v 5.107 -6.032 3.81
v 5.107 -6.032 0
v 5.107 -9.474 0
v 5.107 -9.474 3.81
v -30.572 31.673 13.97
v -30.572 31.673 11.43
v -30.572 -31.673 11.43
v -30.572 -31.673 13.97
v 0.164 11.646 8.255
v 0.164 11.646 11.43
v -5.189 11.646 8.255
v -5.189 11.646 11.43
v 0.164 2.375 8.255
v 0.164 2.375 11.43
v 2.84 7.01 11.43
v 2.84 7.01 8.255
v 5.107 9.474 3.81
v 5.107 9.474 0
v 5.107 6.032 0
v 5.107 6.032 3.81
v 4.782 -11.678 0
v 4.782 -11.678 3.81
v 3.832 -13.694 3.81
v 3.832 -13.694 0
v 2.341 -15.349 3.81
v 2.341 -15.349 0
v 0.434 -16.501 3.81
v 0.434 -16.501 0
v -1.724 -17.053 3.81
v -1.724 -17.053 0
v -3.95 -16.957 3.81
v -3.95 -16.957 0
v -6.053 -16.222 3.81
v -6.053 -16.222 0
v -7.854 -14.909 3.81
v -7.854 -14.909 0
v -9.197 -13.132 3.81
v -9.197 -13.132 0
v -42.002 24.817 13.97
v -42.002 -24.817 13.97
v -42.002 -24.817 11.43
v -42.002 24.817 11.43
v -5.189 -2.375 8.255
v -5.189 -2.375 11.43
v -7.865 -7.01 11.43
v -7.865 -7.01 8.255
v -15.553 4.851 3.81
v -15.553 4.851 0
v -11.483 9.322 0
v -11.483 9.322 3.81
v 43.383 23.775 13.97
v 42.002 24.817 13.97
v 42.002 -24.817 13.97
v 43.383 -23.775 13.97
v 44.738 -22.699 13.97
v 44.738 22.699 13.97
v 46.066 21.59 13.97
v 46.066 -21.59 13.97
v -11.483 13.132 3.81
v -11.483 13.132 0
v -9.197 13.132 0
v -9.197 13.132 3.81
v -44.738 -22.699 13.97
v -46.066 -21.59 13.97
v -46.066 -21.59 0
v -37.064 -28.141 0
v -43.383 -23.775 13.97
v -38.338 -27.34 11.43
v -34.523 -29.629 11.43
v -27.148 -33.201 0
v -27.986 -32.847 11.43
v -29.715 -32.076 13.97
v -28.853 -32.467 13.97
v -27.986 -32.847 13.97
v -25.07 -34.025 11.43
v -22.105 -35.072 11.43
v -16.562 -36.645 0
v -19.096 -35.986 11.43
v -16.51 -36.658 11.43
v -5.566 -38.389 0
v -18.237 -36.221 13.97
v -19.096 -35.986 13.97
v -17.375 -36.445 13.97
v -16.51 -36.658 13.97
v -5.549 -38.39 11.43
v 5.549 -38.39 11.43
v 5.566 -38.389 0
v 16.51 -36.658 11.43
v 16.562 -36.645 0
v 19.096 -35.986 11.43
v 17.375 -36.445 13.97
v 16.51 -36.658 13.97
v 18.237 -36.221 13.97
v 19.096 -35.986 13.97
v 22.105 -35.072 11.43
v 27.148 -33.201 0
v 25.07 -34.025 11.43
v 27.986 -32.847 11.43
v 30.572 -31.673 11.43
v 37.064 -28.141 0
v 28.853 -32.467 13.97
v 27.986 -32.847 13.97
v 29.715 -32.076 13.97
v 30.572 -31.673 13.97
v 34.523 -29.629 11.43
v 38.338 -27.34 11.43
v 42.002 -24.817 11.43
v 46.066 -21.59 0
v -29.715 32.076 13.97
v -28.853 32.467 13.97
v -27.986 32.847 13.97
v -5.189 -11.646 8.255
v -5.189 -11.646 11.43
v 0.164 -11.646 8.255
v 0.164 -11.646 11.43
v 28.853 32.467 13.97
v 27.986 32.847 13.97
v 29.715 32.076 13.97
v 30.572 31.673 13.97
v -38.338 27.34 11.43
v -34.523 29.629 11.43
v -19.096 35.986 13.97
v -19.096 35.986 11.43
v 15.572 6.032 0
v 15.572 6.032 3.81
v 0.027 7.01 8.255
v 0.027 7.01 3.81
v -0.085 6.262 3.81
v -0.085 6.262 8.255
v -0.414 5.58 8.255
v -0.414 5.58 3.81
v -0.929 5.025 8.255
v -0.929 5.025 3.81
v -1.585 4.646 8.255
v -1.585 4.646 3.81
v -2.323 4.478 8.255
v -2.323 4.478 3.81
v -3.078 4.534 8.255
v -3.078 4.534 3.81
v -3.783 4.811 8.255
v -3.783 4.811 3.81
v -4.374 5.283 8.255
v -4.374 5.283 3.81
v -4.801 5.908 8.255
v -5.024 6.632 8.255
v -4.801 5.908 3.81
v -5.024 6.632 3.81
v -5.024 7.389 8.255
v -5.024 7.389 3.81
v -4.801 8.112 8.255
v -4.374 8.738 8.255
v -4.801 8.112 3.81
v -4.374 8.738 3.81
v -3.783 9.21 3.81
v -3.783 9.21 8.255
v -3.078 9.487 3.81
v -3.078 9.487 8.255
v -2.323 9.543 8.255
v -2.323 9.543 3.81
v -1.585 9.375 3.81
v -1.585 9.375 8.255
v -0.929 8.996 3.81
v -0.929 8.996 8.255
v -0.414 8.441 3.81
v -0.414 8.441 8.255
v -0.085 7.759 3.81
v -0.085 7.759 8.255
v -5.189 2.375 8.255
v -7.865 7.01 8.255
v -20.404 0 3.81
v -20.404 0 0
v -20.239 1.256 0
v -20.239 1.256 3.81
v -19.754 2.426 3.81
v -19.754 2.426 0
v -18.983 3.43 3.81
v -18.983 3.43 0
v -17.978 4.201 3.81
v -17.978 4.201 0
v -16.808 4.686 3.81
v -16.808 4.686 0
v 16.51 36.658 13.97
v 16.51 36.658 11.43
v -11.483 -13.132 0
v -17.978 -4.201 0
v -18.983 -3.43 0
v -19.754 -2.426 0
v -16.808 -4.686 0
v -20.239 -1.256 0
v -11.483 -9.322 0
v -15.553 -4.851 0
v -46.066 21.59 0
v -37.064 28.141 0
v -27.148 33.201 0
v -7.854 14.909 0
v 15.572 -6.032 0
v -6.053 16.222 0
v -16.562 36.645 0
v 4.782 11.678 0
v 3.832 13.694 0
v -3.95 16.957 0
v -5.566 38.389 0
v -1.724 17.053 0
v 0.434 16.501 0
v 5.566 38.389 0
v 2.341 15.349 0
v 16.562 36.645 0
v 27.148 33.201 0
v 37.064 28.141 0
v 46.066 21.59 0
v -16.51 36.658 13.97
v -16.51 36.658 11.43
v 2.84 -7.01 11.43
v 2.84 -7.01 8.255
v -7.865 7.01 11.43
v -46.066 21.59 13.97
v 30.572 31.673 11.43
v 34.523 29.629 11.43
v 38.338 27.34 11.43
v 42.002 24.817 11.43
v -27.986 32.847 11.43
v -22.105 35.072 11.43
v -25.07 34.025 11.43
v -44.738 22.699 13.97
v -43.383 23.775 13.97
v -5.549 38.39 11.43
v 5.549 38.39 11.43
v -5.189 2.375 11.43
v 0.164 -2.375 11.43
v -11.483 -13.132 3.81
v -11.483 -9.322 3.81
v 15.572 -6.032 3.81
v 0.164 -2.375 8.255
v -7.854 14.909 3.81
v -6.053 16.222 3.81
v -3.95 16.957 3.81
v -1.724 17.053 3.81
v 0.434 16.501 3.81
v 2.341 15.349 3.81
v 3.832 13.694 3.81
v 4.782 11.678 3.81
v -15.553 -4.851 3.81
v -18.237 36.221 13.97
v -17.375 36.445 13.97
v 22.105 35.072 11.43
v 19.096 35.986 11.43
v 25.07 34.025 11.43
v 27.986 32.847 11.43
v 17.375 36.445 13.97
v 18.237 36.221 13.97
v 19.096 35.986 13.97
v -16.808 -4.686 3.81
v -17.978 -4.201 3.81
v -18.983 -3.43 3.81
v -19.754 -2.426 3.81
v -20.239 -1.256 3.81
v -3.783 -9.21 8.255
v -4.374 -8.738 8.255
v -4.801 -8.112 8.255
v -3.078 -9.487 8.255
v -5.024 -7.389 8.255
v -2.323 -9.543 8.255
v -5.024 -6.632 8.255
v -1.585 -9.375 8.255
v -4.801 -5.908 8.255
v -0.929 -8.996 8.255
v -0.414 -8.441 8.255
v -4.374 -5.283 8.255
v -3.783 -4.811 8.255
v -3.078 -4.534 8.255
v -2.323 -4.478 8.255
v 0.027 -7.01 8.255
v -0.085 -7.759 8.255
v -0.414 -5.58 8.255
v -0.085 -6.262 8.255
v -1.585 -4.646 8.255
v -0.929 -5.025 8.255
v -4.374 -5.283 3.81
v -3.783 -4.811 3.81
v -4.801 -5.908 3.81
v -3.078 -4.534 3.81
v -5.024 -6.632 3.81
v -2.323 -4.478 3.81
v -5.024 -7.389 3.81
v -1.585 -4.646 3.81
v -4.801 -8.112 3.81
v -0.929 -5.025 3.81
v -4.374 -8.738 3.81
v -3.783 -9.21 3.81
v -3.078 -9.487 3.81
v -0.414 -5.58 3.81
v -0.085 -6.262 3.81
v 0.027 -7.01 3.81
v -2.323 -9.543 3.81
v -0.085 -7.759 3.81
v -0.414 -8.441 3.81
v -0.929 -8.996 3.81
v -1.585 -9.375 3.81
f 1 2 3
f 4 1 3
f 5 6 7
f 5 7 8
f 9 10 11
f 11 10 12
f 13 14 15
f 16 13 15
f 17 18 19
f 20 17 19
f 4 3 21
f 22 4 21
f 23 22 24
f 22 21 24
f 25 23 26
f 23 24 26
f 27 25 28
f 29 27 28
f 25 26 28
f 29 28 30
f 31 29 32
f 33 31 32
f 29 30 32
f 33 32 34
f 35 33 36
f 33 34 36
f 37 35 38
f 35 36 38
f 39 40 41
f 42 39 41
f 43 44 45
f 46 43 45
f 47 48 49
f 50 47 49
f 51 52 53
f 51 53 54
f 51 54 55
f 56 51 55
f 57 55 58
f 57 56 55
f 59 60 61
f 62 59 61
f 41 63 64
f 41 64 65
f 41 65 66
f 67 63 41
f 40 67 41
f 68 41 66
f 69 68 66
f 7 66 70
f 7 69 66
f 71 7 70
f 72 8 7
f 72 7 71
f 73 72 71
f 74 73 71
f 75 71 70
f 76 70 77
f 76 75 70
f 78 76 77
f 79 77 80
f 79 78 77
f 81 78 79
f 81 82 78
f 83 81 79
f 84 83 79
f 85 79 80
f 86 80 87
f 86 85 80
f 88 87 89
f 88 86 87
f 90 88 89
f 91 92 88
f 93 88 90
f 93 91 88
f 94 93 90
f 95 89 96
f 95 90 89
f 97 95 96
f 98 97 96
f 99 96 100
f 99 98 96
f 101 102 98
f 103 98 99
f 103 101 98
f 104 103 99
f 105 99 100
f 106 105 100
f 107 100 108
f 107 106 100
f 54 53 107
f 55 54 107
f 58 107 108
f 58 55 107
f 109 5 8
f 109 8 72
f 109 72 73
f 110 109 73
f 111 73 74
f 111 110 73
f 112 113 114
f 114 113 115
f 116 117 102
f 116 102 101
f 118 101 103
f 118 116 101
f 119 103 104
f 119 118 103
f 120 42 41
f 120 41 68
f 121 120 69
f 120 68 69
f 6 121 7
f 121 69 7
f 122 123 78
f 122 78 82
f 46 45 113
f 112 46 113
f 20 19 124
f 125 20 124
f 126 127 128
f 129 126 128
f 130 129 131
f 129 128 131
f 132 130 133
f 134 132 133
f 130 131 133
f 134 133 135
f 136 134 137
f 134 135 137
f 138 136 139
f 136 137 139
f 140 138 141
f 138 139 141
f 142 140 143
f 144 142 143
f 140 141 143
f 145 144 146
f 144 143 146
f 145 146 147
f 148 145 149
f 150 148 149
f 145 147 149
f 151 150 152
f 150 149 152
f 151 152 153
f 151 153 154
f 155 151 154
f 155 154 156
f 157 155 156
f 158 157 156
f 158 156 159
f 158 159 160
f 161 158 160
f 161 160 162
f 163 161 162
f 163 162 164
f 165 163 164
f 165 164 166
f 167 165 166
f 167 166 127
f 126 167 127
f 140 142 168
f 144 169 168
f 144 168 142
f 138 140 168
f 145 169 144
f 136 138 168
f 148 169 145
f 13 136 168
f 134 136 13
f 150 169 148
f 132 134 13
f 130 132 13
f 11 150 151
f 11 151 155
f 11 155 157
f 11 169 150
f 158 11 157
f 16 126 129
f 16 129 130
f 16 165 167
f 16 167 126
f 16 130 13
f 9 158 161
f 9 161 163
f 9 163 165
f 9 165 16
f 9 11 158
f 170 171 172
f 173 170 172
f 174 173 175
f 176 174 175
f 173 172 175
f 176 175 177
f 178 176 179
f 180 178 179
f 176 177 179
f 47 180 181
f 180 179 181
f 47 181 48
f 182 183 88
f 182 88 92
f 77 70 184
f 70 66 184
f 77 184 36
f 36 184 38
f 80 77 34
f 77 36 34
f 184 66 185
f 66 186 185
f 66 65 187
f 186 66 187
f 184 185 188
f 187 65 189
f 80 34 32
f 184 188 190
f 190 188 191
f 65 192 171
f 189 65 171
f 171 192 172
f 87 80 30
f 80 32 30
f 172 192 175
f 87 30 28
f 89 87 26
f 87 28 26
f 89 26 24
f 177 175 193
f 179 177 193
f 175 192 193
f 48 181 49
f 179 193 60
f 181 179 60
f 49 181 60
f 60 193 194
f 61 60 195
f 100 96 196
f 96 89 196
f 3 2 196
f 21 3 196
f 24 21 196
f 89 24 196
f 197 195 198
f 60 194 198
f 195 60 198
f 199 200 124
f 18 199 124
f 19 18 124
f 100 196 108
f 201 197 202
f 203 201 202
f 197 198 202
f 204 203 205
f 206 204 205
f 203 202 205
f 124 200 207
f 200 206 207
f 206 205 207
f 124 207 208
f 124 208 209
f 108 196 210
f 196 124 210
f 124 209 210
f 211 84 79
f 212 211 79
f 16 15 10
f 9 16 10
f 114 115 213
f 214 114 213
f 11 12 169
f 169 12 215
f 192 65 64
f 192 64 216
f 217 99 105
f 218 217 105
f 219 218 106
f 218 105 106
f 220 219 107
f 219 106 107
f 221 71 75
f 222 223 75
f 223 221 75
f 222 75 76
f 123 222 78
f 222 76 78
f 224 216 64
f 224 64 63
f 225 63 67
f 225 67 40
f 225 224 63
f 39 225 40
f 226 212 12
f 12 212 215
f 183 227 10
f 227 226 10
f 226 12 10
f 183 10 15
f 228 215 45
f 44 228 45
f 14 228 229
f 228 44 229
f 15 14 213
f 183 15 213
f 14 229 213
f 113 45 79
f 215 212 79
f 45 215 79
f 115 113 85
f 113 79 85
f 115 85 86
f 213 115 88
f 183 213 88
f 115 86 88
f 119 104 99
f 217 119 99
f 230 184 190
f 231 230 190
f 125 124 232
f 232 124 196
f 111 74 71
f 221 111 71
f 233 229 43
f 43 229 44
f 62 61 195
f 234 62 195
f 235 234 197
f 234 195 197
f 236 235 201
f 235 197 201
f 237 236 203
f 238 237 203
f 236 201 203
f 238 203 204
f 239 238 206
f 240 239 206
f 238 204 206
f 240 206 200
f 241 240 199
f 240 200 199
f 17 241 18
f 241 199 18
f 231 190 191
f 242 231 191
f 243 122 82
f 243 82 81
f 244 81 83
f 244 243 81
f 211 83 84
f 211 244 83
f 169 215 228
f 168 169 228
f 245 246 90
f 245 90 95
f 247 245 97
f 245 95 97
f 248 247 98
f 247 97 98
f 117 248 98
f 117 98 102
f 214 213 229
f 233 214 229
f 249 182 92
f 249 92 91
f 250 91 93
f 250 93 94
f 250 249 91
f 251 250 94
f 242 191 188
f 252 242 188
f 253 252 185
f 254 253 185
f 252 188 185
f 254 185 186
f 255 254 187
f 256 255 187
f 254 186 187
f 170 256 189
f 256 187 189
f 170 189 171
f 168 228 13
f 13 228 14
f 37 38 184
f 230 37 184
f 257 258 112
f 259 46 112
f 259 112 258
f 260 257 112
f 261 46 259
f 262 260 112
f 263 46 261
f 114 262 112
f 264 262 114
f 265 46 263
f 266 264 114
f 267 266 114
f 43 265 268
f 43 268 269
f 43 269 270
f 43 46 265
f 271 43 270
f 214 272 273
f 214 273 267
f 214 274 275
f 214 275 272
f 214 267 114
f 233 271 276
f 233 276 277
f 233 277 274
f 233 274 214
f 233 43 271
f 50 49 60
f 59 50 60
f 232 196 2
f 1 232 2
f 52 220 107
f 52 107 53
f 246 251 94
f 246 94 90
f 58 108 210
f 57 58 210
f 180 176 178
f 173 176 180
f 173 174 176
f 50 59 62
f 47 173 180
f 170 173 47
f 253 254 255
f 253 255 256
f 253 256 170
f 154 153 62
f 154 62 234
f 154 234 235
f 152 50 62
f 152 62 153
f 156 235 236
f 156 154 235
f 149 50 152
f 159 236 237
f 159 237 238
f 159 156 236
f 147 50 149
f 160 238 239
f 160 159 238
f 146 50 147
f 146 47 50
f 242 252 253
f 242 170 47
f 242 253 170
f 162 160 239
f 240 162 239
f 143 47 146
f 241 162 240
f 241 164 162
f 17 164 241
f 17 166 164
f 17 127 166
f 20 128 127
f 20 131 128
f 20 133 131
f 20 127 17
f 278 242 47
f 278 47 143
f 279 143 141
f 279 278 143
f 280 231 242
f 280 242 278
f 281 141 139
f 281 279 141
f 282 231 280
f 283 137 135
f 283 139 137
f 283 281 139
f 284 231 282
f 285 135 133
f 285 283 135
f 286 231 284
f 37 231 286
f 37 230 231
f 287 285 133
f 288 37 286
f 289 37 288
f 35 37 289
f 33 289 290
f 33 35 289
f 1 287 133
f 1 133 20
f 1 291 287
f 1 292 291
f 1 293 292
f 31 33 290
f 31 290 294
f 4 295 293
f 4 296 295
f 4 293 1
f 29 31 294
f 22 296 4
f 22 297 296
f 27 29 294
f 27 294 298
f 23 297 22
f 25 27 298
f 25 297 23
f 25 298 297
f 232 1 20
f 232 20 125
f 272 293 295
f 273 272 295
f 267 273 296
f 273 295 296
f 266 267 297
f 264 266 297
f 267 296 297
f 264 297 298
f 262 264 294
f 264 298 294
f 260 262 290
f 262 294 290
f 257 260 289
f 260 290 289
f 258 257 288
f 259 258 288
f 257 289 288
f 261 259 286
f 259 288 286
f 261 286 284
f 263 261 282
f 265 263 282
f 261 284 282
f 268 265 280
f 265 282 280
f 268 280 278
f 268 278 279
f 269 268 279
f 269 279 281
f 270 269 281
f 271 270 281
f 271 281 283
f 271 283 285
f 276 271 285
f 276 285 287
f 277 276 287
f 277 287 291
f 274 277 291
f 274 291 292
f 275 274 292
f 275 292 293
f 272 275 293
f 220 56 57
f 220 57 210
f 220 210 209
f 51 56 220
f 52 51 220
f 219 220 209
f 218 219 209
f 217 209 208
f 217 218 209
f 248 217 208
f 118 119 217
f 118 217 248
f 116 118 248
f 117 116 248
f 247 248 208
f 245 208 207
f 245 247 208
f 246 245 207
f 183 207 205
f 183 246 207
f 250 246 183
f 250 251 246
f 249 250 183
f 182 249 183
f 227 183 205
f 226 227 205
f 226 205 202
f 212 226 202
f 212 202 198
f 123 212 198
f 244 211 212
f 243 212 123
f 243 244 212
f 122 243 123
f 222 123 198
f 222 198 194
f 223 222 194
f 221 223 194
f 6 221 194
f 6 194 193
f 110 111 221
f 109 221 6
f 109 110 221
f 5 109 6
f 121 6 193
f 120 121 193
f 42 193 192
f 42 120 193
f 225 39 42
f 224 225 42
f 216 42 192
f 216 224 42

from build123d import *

# Parameters (mm, degrees)
F0_W      = 92.131638
F0_H      = 77.216
F1_DEPTH  = 13.97
F3_DEPTH  = 13.971
F5_DEPTH  = 38.609
F6_DEPTH  = 38.609
F8_DEPTH  = 3.81
F9_R      = 2.54
F10_DEPTH = 25.4
F12_DEPTH = 3.175


with BuildPart() as f1:
    # F0 (on Top) → F1 (new body)
    with BuildSketch(Plane.XY):
        Rectangle(F0_W, F0_H)
    extrude(amount=F1_DEPTH)

    # F2 (on face) → F3 (intersect, through all)
    with BuildSketch(Plane.XY.offset(13.97)):
        with BuildLine():
            Line((46.065819, 0), (46.065819, 21.59))
            ThreePointArc((46.065819, 21.59), (0, 38.608), (-46.065819, 21.59))
            Line((-46.065819, 21.59), (-46.065819, 0))
            Line((-46.065819, 0), (-46.065819, -21.59))
            ThreePointArc((-46.065819, -21.59), (0, -38.608), (46.065819, -21.59))
            Line((46.065819, -21.59), (46.065819, 0))
        make_face()
    extrude(amount=-F3_DEPTH, mode=Mode.INTERSECT)

    # F4 (on Front) → F5 (cut, through all)
    with BuildSketch(Plane.XZ):
        Polygon((30.571819, 13.97), (30.571819, 12.7), (30.571819, 11.43), (42.001819, 11.43), (42.001819, 13.97), align=None)
        Polygon((19.095909, 13.97), (19.095909, 12.7), (19.095909, 11.43), (27.985909, 11.43), (27.985909, 12.7), (27.985909, 13.97), align=None)
        Polygon((-16.51, 13.97), (-16.51, 12.7), (-16.51, 11.43), (0, 11.43), (16.51, 11.43), (16.51, 12.7), (16.51, 13.97), align=None)
        Polygon((-27.985909, 13.97), (-27.985909, 12.7), (-27.985909, 11.43), (-19.095909, 11.43), (-19.095909, 12.7), (-19.095909, 13.97), align=None)
        Polygon((-30.571819, 13.97), (-42.001819, 13.97), (-42.001819, 11.43), (-30.571819, 11.43), (-30.571819, 12.7), align=None)
    extrude(amount=-F5_DEPTH, mode=Mode.SUBTRACT)

    # F4 (on Front) → F6 (cut, through all)
    with BuildSketch(Plane.XZ):
        Polygon((30.571819, 13.97), (30.571819, 12.7), (30.571819, 11.43), (42.001819, 11.43), (42.001819, 13.97), align=None)
        Polygon((19.095909, 13.97), (19.095909, 12.7), (19.095909, 11.43), (27.985909, 11.43), (27.985909, 12.7), (27.985909, 13.97), align=None)
        Polygon((-16.51, 13.97), (-16.51, 12.7), (-16.51, 11.43), (0, 11.43), (16.51, 11.43), (16.51, 12.7), (16.51, 13.97), align=None)
        Polygon((-27.985909, 13.97), (-27.985909, 12.7), (-27.985909, 11.43), (-19.095909, 11.43), (-19.095909, 12.7), (-19.095909, 13.97), align=None)
        Polygon((-30.571819, 13.97), (-42.001819, 13.97), (-42.001819, 11.43), (-30.571819, 11.43), (-30.571819, 12.7), align=None)
    extrude(amount=F6_DEPTH, mode=Mode.SUBTRACT)

    # F7 (on face) → F8 (cut)
    with BuildSketch(Plane(origin=(0, 0, 0), x_dir=(1, 0, 0), z_dir=(0, 0, -1))):
        with BuildLine():
            ThreePointArc((-15.552723, 4.8514), (-18.983181, 3.430458), (-20.404123, 0))
            ThreePointArc((-20.404123, 0), (-18.983181, -3.430458), (-15.552723, -4.8514))
            Line((-15.552723, -4.8514), (-11.483329, -9.3218))
            Line((-11.483329, -9.3218), (-11.483329, -13.1318))
            Line((-11.483329, -13.1318), (-9.197329, -13.1318))
            ThreePointArc((-9.197329, -13.1318), (-0.624908, -16.856695), (5.107457, -9.4742))
            Line((5.107457, -9.4742), (5.107457, -6.0325))
            Line((5.107457, -6.0325), (15.572257, -6.0325))
            Line((15.572257, -6.0325), (15.572257, 0))
            Line((15.572257, 0), (15.572257, 6.0325))
            Line((15.572257, 6.0325), (5.107457, 6.0325))
            Line((5.107457, 6.0325), (5.107457, 9.4742))
            ThreePointArc((5.107457, 9.4742), (-0.624908, 16.856695), (-9.197329, 13.1318))
            Line((-9.197329, 13.1318), (-11.483329, 13.1318))
            Line((-11.483329, 13.1318), (-11.483329, 9.3218))
            Line((-11.483329, 9.3218), (-15.552723, 4.8514))
        make_face()
    extrude(amount=-F8_DEPTH, mode=Mode.SUBTRACT)

    # F9 (on face) → F10 (cut)
    with BuildSketch(Plane(origin=(0, 0, 3.81), x_dir=(1, 0, 0), z_dir=(0, 0, -1))):
        with Locations((-2.512543, -7.0104)):
            Circle(F9_R)
        with Locations((-2.512543, 7.0104)):
            Circle(F9_R)
    extrude(amount=-F10_DEPTH, mode=Mode.SUBTRACT)

    # F11 (on face) → F12 (cut)
    with BuildSketch(Plane.XY.offset(11.43)):
        Polygon((-5.18885, -2.3749), (-7.865157, -7.0104), (-5.18885, -11.6459), (0.163764, -11.6459), (2.840071, -7.0104), (0.163764, -2.3749), align=None)
        Polygon((0.163764, 11.6459), (-5.18885, 11.6459), (-7.865157, 7.0104), (-5.18885, 2.3749), (0.163764, 2.3749), (2.840071, 7.0104), align=None)
    extrude(amount=-F12_DEPTH, mode=Mode.SUBTRACT)


solid = f1.part
